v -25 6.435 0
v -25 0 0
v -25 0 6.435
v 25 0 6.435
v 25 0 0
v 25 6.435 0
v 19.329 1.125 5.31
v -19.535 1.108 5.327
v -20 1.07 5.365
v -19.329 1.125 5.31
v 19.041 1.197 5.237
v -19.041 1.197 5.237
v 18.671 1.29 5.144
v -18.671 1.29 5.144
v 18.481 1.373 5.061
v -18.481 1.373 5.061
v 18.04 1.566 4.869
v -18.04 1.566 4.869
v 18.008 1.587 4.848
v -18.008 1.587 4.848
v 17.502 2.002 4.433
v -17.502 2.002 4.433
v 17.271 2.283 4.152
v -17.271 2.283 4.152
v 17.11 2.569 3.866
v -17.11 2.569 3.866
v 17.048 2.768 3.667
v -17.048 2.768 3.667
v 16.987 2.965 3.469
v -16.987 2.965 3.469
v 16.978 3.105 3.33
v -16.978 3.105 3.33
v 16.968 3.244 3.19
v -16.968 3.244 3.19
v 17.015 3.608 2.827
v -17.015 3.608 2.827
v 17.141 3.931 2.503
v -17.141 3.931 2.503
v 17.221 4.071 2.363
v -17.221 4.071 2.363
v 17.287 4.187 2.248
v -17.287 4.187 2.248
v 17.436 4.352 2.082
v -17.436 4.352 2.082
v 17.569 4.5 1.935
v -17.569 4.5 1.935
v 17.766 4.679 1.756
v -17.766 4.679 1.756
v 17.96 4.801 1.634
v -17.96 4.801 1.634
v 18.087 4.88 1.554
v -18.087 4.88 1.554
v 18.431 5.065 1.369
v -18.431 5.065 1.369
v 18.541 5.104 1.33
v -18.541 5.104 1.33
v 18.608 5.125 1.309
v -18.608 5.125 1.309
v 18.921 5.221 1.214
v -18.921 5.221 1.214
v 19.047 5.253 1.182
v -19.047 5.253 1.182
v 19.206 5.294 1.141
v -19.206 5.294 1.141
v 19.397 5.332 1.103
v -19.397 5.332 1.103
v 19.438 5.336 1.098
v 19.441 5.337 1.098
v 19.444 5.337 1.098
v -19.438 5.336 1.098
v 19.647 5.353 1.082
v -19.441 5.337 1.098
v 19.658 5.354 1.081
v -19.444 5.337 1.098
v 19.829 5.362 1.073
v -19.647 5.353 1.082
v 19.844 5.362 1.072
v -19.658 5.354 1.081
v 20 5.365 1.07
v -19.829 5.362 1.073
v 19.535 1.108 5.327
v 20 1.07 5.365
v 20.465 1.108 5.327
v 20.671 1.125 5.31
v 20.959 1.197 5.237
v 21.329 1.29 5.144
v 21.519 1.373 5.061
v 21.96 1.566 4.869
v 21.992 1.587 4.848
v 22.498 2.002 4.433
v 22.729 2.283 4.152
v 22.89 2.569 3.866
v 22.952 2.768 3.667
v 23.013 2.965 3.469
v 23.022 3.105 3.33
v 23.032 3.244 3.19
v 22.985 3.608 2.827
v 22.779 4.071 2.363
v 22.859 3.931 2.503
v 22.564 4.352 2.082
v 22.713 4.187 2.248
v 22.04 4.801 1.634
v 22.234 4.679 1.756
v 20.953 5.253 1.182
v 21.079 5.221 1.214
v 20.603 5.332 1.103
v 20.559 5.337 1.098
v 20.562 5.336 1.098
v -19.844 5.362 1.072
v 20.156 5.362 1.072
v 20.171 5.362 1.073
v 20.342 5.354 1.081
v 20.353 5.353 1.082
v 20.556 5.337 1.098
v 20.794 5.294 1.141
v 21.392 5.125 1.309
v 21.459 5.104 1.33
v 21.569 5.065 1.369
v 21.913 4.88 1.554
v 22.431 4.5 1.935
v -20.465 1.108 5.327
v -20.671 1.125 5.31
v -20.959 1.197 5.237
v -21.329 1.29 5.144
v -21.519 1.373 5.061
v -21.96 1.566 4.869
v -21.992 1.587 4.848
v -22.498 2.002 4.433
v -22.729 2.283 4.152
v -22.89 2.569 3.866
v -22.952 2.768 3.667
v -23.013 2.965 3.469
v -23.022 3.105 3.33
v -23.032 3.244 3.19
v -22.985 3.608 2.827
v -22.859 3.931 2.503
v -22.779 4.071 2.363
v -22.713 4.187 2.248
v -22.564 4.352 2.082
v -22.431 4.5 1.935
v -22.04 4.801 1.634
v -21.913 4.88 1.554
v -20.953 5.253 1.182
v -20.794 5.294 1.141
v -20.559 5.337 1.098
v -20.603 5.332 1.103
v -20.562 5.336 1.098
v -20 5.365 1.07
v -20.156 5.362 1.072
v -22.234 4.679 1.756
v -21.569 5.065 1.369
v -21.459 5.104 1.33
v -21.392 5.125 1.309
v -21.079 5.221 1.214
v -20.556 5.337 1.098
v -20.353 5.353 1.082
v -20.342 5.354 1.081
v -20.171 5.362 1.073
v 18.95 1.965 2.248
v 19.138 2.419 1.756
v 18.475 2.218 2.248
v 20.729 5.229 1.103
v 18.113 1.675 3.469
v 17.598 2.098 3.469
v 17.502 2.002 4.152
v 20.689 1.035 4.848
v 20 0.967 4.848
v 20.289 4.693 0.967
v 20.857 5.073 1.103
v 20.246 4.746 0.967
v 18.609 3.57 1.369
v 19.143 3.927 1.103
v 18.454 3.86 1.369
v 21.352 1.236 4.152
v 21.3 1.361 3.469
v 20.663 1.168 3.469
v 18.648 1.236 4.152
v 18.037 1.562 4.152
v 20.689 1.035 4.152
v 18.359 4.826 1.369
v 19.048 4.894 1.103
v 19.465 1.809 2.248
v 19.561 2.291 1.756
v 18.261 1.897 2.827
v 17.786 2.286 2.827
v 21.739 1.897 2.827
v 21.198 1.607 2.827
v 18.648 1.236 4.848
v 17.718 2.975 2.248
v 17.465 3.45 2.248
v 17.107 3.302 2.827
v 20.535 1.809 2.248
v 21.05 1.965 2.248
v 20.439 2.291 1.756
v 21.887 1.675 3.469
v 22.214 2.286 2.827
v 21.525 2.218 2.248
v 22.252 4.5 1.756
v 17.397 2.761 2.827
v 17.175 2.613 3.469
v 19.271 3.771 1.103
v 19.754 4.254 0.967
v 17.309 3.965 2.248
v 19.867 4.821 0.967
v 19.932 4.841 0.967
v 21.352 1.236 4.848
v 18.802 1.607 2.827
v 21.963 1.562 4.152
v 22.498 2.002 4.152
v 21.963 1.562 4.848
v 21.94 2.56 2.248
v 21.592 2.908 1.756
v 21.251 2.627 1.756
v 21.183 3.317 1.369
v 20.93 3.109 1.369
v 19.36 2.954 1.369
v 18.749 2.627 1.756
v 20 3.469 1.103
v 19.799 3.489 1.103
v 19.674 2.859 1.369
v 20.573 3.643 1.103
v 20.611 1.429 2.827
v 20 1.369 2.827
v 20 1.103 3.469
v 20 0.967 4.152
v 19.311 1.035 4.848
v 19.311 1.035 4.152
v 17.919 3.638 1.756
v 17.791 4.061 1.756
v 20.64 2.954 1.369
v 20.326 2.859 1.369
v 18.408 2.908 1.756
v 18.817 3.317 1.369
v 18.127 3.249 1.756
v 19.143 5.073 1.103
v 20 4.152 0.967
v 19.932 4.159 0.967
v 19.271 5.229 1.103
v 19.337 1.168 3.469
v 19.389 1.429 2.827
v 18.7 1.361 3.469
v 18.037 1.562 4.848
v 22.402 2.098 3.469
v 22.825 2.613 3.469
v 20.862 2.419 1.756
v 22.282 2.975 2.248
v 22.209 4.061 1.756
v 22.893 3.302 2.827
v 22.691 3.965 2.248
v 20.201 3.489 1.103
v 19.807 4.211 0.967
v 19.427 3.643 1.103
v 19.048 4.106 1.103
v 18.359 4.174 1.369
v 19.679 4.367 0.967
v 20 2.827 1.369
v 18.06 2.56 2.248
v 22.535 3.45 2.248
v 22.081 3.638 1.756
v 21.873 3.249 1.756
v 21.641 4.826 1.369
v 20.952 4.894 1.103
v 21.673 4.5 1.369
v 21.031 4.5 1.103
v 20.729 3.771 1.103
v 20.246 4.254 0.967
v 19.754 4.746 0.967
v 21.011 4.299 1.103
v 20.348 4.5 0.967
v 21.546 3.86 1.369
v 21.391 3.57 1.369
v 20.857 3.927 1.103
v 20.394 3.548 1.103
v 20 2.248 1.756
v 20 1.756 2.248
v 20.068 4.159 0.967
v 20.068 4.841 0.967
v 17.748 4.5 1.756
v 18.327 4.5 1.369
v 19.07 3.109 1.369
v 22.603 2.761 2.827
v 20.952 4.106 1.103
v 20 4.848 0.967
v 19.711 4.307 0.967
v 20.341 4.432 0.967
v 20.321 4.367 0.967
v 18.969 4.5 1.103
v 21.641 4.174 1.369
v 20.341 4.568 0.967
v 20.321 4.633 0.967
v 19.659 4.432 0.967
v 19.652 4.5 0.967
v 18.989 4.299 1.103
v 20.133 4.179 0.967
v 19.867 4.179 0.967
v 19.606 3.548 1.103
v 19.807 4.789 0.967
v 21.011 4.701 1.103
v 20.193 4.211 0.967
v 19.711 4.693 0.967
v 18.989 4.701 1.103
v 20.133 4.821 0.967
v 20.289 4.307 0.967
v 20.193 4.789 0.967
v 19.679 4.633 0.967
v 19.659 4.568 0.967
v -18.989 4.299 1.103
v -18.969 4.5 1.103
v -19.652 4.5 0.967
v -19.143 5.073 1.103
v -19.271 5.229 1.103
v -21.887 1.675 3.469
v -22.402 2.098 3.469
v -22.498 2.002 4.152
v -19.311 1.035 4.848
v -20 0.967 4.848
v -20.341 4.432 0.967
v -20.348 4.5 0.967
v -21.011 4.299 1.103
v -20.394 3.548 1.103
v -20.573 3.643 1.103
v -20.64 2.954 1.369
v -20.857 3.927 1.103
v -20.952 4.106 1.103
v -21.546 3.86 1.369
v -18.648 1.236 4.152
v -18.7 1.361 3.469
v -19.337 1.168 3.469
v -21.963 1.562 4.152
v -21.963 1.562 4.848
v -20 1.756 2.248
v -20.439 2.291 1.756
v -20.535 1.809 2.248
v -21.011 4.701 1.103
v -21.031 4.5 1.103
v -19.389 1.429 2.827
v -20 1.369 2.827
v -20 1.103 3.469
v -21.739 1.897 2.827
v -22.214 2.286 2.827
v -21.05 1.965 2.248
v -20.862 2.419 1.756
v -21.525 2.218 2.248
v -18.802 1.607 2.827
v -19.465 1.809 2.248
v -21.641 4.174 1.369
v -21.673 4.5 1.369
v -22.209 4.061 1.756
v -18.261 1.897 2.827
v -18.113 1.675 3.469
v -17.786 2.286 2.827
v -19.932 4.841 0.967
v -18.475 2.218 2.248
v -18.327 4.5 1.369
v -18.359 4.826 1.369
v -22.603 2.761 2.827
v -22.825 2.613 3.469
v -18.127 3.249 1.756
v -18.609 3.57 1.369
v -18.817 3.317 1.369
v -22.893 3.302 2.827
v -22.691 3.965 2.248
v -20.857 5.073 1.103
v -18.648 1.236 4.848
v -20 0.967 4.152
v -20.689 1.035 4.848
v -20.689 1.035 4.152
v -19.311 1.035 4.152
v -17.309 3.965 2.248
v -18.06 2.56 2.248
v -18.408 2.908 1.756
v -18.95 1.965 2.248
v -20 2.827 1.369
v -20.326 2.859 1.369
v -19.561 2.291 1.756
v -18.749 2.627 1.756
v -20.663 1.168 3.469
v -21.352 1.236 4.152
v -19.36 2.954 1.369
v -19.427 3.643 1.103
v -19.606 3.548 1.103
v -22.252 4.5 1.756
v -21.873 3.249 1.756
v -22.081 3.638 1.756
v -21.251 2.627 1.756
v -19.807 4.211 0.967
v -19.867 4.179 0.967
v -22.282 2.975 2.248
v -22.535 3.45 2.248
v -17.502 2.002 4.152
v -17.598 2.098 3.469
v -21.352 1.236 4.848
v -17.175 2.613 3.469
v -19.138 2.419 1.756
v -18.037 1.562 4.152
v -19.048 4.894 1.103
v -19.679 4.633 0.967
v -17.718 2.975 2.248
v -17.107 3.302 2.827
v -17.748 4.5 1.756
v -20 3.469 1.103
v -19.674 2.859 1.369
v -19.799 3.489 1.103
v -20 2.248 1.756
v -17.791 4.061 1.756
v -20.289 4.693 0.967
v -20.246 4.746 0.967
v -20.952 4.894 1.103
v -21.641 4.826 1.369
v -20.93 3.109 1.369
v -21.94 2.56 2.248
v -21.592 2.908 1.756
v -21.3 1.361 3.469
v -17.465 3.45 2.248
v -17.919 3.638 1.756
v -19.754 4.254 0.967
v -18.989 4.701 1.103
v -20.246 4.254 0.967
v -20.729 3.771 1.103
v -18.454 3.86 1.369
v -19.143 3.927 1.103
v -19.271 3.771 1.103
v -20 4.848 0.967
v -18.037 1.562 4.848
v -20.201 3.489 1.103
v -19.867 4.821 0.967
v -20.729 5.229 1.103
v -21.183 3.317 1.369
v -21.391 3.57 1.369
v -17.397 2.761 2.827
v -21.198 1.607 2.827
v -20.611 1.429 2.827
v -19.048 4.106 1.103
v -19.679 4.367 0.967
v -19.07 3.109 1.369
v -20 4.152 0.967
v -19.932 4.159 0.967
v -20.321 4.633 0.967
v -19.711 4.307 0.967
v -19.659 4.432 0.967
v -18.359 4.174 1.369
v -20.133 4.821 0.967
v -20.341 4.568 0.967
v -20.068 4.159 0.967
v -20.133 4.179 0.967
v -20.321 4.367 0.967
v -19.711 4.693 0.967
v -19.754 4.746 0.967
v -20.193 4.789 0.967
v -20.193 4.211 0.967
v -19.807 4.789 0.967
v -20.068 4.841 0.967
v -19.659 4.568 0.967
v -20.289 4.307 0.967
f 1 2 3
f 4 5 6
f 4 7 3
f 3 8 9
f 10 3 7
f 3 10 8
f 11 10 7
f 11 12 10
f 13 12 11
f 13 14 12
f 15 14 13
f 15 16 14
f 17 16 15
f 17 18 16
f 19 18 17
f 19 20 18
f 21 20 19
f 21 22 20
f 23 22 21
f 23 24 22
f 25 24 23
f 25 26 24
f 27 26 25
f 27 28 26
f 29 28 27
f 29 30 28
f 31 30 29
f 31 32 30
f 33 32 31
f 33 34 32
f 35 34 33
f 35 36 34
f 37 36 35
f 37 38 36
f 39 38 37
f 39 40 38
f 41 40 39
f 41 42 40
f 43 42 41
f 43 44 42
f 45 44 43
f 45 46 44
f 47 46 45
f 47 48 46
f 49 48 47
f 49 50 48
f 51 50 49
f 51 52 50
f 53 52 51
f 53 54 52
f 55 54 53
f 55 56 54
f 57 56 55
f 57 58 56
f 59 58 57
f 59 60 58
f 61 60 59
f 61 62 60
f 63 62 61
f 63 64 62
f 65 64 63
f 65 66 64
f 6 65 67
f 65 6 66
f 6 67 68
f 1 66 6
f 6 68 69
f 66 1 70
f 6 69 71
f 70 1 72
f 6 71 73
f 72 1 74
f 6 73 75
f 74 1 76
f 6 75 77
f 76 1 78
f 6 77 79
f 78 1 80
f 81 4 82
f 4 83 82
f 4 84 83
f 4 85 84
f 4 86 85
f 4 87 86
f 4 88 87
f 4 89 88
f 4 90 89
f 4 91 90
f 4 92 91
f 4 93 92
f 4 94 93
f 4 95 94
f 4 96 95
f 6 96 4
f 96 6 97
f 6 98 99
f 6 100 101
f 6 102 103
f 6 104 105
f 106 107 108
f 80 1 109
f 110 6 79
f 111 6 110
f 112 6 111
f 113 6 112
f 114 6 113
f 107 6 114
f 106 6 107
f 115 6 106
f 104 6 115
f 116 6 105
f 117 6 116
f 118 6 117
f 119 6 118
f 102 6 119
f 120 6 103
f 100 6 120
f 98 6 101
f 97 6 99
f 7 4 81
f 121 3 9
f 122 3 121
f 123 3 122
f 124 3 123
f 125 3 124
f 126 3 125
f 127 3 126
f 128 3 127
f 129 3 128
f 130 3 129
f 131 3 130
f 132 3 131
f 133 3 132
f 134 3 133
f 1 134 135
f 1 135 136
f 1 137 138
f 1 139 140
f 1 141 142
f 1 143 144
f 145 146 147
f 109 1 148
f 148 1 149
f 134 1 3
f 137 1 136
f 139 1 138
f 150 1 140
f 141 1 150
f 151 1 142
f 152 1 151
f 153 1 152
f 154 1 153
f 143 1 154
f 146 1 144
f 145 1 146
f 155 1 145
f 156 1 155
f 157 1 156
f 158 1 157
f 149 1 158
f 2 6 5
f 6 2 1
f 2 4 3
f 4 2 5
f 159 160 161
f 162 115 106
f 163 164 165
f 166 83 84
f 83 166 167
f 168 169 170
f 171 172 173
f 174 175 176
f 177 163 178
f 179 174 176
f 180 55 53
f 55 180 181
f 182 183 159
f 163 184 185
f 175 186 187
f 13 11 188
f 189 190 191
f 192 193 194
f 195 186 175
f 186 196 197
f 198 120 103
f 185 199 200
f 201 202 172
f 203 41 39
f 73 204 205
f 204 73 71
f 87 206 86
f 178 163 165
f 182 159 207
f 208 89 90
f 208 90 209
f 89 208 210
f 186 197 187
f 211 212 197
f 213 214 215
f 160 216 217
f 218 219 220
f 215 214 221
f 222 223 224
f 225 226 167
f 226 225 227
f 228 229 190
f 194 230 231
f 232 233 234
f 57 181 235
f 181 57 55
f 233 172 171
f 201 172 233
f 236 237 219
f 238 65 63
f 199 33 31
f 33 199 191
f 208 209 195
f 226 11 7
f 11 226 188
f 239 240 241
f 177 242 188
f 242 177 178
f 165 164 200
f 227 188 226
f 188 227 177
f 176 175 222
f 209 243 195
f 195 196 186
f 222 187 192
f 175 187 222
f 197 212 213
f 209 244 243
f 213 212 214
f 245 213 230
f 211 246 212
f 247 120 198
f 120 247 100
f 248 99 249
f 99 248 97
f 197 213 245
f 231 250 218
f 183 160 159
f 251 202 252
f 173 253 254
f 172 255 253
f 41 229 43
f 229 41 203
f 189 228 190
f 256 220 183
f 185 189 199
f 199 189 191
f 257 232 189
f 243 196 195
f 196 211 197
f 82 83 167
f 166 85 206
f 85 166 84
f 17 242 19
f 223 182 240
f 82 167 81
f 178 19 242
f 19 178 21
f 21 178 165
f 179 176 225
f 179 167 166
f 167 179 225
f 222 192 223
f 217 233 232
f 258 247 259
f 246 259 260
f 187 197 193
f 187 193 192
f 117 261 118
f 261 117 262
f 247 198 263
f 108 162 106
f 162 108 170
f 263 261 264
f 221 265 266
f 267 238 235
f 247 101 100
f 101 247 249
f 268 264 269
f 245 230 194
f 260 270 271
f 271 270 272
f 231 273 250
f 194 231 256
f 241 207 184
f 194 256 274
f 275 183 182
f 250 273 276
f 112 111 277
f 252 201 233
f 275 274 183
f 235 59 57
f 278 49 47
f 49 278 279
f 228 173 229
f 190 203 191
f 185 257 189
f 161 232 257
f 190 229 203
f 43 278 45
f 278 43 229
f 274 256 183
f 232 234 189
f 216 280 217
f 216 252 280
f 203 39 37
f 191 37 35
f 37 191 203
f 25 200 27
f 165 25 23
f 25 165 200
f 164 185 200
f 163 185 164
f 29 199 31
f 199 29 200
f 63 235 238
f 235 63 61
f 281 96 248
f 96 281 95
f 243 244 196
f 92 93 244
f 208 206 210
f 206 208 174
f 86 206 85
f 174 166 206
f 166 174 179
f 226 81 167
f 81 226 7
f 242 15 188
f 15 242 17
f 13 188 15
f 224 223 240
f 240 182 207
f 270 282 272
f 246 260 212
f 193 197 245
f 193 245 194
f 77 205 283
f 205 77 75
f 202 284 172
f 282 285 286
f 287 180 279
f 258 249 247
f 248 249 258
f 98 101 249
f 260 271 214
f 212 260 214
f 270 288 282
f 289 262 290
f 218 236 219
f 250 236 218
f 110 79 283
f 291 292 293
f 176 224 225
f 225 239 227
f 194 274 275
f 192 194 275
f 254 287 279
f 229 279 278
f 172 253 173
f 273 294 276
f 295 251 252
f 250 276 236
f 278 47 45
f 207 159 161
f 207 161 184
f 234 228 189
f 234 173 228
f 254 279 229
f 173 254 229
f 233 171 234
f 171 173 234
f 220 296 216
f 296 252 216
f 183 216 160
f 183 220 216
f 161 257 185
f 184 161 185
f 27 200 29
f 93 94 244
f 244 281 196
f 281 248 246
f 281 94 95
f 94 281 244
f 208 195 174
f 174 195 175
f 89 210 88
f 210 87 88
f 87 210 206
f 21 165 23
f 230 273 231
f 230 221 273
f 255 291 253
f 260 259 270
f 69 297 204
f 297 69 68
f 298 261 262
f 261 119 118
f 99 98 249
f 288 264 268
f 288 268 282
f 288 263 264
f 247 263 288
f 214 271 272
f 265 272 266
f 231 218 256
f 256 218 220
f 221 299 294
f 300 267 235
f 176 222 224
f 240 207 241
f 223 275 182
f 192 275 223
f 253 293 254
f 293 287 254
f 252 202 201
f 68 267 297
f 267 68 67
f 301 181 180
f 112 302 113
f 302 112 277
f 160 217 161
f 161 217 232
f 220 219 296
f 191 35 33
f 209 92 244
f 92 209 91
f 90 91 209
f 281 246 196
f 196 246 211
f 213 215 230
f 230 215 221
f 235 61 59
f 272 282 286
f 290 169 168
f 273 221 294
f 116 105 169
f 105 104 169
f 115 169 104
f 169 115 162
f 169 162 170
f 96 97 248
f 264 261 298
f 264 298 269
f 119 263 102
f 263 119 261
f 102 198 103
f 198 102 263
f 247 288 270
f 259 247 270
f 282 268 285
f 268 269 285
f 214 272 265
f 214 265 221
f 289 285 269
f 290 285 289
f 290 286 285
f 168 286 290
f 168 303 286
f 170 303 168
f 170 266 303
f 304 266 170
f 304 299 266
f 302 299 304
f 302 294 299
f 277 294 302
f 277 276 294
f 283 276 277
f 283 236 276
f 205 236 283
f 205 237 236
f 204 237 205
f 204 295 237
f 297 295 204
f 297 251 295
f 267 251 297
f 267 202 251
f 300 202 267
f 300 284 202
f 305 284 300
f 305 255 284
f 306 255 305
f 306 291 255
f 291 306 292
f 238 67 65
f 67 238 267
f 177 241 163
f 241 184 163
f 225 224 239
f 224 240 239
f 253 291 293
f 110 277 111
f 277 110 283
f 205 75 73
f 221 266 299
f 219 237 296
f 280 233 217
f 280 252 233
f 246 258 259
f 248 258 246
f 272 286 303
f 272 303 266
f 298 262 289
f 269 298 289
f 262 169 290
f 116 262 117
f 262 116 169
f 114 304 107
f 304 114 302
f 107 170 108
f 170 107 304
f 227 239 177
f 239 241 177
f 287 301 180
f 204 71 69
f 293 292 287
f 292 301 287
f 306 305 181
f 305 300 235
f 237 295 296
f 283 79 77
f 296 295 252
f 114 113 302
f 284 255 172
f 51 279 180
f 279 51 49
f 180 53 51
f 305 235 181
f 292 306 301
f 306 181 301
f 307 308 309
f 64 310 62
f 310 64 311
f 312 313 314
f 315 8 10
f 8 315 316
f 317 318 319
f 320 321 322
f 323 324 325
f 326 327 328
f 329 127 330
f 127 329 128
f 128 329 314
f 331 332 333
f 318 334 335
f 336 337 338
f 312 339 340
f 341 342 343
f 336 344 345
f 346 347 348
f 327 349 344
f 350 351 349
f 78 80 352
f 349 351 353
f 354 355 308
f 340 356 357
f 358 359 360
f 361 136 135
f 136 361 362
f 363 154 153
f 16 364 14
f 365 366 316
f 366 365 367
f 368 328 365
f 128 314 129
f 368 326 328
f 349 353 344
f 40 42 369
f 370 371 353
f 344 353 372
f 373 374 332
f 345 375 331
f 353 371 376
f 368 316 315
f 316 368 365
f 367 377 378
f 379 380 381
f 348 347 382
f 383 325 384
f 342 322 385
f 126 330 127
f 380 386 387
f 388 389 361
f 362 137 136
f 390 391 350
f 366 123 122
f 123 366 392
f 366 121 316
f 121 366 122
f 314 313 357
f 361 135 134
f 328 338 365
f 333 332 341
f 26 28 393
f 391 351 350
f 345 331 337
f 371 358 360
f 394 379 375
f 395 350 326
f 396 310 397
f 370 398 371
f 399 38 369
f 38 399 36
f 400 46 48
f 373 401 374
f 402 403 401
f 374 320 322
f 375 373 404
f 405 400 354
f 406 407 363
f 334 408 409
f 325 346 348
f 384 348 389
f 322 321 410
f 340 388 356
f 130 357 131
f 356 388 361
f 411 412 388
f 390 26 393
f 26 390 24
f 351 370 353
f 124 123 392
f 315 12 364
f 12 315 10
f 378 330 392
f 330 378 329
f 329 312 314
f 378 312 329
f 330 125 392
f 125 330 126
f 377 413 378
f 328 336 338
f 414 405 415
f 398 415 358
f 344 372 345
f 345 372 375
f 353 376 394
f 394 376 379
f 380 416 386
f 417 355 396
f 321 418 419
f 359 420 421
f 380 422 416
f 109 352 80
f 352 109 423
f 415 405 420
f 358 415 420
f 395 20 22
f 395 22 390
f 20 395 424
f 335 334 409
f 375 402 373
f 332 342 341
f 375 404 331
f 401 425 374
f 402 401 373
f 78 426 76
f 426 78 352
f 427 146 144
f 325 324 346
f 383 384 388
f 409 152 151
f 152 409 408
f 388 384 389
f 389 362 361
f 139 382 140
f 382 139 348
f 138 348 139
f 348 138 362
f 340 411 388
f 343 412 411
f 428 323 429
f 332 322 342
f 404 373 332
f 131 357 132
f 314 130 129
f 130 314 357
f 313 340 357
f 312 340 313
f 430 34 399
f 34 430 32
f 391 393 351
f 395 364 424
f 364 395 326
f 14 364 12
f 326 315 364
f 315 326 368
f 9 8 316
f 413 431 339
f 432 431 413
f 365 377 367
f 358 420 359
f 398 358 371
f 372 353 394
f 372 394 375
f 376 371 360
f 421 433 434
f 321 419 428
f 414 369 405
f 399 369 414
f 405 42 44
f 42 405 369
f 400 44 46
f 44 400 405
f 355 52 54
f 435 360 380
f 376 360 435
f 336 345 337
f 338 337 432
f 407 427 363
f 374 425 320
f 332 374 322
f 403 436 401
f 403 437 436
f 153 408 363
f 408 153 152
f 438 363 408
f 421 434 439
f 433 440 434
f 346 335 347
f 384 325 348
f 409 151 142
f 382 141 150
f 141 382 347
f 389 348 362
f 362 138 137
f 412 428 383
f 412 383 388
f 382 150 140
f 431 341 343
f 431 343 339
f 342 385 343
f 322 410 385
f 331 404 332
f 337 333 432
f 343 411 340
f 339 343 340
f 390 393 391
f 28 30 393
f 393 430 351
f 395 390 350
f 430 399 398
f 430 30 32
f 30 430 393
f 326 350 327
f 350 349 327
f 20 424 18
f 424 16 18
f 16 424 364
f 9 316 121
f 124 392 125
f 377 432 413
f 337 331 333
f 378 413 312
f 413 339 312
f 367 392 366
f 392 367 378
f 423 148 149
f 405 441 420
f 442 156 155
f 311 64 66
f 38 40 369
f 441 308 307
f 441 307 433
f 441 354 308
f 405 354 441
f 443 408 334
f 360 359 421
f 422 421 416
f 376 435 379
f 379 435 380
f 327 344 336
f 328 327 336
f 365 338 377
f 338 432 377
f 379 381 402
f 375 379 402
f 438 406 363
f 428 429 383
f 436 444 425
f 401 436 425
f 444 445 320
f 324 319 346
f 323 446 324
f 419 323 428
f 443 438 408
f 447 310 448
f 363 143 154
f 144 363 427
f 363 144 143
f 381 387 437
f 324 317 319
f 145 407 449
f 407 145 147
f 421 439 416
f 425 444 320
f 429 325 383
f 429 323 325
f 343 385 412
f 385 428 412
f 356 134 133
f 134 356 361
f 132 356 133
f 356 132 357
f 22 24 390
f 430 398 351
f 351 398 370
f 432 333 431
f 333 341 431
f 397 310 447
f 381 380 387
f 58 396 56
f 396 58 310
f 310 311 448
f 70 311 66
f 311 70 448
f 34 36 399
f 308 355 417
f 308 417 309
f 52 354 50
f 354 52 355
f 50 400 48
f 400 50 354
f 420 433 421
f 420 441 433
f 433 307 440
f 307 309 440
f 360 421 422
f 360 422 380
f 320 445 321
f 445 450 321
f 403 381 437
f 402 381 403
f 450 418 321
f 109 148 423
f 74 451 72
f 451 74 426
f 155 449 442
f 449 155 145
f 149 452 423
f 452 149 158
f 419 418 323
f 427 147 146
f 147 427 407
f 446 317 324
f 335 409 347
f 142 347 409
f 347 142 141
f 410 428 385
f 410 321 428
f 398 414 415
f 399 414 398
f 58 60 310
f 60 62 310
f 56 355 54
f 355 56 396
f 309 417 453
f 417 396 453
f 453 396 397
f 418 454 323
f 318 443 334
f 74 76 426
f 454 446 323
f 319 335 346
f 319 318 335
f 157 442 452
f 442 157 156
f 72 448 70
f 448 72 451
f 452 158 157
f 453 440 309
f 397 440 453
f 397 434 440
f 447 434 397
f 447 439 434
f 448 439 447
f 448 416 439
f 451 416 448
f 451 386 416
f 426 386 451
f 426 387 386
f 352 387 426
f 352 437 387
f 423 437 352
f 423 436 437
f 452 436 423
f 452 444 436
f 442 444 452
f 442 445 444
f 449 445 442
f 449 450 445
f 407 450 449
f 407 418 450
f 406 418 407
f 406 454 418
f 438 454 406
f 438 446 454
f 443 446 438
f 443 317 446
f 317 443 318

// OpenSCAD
/*
translate([0,1.075,0]) import("NewEffectorCentered.stl");
//#cylinder(r=8, h=80);

for(a = [0:120:240])
    rotate([0,0,a])
            rotate([0,90,0]) {
                translate([-4,-25,-24]) cylinder(r=2.6, h=4, $fn=32);
                translate([-4,-25,20]) cylinder(r=2.6, h=4, $fn=32);

                #translate([-4,-25,-30]) cylinder(r=1.5, h=60, $fn=16);
            }
*/

ballBearingDiameter = 7.1;

difference() {
    rotate([45,0,0])
    cube([50, ballBearingDiameter+2, ballBearingDiameter+2], center=true);

    translate([-26, -10, -20])
    cube([52, 20, 20]);

    translate([-26, -10, -1])
    cube([52, 10, 10]);
    
    translate([20,4.5,4.5])
    sphere(d=ballBearingDiameter, $fn=32);

    translate([-20,4.5,4.5])
    sphere(d=ballBearingDiameter, $fn=32);
}
